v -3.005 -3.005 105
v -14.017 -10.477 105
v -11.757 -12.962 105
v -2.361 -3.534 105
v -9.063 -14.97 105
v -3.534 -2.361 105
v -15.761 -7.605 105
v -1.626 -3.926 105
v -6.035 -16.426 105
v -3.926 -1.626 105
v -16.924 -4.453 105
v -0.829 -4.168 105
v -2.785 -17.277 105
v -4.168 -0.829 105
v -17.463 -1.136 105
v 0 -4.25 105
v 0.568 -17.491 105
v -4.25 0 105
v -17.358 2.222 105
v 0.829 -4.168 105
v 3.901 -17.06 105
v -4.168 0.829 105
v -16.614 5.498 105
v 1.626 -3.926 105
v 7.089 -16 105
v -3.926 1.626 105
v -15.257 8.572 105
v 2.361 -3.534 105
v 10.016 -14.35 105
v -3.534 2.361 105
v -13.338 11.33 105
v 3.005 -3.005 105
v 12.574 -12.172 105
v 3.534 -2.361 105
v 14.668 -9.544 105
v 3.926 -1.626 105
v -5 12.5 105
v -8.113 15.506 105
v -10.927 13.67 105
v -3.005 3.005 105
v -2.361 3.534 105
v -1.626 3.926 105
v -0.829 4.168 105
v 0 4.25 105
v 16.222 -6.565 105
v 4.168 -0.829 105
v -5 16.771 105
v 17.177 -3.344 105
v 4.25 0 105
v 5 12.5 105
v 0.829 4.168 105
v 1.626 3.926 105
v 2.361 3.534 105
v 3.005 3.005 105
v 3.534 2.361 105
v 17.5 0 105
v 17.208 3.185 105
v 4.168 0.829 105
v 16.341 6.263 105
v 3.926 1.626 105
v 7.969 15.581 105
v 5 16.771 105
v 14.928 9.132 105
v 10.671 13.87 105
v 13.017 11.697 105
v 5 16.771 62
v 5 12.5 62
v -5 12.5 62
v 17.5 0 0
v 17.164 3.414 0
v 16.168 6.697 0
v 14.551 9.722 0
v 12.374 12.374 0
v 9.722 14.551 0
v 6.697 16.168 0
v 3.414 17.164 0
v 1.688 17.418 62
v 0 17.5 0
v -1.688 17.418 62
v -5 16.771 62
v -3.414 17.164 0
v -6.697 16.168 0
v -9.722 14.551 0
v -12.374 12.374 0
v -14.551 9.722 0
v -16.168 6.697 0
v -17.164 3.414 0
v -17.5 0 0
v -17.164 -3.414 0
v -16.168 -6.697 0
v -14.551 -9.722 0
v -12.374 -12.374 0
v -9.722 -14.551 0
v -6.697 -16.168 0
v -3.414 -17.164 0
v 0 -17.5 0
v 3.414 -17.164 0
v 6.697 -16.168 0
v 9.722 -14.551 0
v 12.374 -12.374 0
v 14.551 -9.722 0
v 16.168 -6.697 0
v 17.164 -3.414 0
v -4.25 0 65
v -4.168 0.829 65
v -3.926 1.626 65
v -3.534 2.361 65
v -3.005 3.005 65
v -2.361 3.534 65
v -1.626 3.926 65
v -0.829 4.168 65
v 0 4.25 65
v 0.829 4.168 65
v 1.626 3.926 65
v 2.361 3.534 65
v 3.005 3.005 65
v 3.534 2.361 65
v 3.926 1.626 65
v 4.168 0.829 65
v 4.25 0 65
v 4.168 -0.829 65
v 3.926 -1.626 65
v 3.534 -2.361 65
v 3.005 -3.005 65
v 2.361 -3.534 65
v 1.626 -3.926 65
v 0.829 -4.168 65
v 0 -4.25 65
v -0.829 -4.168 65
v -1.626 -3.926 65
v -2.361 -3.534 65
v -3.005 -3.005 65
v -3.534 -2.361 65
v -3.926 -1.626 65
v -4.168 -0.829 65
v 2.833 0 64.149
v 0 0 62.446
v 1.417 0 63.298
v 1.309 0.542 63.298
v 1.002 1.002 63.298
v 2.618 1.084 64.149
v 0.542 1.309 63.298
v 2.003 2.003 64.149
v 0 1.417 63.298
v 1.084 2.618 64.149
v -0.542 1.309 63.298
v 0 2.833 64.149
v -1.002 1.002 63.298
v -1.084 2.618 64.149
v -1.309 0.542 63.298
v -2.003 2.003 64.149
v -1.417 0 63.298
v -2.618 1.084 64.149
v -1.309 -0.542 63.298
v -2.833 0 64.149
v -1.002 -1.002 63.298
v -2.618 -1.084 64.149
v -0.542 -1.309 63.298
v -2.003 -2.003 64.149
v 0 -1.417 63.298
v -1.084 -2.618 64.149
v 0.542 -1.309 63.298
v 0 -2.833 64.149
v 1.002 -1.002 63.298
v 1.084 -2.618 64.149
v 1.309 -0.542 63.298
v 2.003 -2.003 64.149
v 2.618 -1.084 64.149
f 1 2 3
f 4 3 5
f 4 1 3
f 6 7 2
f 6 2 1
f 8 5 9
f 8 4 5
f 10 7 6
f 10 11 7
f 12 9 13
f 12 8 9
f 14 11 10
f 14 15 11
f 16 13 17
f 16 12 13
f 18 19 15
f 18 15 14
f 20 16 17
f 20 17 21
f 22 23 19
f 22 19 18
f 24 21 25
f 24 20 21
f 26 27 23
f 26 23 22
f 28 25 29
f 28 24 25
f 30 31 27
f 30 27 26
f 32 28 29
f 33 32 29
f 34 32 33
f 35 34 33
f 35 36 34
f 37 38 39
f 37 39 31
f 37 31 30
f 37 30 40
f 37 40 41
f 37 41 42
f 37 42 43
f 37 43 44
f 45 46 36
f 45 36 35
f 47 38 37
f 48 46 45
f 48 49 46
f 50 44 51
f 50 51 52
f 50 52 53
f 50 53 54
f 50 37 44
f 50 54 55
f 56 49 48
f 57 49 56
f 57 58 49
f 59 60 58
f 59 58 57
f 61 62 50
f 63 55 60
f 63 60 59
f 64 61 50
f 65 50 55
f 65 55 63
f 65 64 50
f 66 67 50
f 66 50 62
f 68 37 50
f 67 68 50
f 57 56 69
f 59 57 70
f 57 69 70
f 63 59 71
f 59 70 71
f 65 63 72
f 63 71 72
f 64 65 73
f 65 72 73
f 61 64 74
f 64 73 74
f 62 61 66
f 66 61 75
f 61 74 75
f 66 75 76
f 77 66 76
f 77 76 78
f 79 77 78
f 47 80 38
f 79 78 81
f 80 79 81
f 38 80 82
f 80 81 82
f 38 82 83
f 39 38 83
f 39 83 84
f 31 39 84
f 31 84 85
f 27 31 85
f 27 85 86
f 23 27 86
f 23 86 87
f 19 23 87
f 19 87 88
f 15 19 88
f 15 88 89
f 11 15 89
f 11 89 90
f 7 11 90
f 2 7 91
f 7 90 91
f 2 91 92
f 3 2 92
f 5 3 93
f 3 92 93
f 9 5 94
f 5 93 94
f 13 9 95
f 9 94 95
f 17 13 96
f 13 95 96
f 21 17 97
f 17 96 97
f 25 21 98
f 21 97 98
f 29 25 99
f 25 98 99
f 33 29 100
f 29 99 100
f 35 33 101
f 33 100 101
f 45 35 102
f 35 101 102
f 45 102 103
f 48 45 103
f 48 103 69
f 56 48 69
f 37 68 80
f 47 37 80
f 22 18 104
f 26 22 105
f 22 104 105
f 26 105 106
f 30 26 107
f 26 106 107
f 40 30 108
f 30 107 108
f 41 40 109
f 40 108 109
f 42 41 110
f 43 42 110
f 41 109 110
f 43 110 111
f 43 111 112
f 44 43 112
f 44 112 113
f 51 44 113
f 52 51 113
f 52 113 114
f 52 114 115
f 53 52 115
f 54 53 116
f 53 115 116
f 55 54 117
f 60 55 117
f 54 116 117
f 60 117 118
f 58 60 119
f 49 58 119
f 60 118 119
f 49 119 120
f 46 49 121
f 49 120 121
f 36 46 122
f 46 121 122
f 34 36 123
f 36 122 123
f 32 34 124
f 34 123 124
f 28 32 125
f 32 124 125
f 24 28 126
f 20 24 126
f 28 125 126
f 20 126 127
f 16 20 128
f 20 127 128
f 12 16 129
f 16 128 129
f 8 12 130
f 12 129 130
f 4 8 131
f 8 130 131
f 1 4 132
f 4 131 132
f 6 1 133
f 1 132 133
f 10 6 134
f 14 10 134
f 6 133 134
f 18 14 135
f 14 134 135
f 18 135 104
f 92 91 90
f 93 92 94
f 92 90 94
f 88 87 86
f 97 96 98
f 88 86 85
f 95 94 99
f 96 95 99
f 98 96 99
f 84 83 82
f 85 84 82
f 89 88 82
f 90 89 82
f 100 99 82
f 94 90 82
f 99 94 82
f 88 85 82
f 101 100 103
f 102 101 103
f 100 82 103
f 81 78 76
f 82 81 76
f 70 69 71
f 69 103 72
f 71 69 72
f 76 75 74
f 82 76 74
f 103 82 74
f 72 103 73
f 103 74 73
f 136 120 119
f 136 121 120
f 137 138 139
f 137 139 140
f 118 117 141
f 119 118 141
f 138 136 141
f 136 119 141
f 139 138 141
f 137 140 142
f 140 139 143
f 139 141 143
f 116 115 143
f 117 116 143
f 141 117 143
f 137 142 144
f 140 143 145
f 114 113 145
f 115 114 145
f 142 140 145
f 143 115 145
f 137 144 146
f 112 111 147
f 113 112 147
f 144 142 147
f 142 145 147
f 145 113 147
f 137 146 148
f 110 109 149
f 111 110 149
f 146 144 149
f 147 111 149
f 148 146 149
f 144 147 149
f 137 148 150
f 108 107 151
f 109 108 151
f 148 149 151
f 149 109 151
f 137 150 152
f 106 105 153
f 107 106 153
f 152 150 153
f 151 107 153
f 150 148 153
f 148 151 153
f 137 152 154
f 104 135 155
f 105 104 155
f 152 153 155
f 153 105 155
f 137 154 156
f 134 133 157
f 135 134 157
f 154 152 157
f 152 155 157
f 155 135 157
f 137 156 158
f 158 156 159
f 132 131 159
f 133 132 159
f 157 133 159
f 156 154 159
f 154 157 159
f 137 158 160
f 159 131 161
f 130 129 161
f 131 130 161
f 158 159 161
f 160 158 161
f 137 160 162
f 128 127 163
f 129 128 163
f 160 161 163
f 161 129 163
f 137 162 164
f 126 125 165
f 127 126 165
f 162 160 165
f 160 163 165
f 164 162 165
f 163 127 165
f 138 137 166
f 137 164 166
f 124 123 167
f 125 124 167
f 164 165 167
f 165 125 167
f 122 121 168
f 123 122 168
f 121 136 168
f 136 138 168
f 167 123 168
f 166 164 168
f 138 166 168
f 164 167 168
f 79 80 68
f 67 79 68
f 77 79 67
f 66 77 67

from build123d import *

# Parameters (mm, degrees)
ESQUISSE1_R             = 17.5
BOSS_EXTRU_1_DEPTH      = 105
ESQUISSE2_W             = 10
ESQUISSE2_H             = 7.08484742
ENL_V_MAT_EXTRU_1_DEPTH = 43
TROU_TARAUD_M101_D      = 8.5
TROU_TARAUD_M101_DEPTH  = 40
TROU_TARAUD_M101_TIP    = 2.553657631


with BuildPart() as part:
    # Esquisse1 → Boss.-Extru.1 (new body)
    with BuildSketch(Plane.XY):
        Circle(ESQUISSE1_R)
    extrude(amount=BOSS_EXTRU_1_DEPTH)

    # Esquisse2 → Enlèv. mat.-Extru.1 (cut)
    with BuildSketch(Plane.XY.offset(105)):
        with Locations((0, 16.04242371)):
            Rectangle(ESQUISSE2_W, ESQUISSE2_H)
    extrude(amount=-ENL_V_MAT_EXTRU_1_DEPTH, mode=Mode.SUBTRACT)

    # Trou taraudé M101
    with Locations(Plane.XY.offset(105)):
        with Locations((0, 0)):
            Hole(TROU_TARAUD_M101_D / 2, depth=TROU_TARAUD_M101_DEPTH)
            with Locations((0, 0, -(TROU_TARAUD_M101_DEPTH + TROU_TARAUD_M101_TIP / 2))):  # 118° drill point
                Cone(0, TROU_TARAUD_M101_D / 2, TROU_TARAUD_M101_TIP, mode=Mode.SUBTRACT)


solid = part.part
